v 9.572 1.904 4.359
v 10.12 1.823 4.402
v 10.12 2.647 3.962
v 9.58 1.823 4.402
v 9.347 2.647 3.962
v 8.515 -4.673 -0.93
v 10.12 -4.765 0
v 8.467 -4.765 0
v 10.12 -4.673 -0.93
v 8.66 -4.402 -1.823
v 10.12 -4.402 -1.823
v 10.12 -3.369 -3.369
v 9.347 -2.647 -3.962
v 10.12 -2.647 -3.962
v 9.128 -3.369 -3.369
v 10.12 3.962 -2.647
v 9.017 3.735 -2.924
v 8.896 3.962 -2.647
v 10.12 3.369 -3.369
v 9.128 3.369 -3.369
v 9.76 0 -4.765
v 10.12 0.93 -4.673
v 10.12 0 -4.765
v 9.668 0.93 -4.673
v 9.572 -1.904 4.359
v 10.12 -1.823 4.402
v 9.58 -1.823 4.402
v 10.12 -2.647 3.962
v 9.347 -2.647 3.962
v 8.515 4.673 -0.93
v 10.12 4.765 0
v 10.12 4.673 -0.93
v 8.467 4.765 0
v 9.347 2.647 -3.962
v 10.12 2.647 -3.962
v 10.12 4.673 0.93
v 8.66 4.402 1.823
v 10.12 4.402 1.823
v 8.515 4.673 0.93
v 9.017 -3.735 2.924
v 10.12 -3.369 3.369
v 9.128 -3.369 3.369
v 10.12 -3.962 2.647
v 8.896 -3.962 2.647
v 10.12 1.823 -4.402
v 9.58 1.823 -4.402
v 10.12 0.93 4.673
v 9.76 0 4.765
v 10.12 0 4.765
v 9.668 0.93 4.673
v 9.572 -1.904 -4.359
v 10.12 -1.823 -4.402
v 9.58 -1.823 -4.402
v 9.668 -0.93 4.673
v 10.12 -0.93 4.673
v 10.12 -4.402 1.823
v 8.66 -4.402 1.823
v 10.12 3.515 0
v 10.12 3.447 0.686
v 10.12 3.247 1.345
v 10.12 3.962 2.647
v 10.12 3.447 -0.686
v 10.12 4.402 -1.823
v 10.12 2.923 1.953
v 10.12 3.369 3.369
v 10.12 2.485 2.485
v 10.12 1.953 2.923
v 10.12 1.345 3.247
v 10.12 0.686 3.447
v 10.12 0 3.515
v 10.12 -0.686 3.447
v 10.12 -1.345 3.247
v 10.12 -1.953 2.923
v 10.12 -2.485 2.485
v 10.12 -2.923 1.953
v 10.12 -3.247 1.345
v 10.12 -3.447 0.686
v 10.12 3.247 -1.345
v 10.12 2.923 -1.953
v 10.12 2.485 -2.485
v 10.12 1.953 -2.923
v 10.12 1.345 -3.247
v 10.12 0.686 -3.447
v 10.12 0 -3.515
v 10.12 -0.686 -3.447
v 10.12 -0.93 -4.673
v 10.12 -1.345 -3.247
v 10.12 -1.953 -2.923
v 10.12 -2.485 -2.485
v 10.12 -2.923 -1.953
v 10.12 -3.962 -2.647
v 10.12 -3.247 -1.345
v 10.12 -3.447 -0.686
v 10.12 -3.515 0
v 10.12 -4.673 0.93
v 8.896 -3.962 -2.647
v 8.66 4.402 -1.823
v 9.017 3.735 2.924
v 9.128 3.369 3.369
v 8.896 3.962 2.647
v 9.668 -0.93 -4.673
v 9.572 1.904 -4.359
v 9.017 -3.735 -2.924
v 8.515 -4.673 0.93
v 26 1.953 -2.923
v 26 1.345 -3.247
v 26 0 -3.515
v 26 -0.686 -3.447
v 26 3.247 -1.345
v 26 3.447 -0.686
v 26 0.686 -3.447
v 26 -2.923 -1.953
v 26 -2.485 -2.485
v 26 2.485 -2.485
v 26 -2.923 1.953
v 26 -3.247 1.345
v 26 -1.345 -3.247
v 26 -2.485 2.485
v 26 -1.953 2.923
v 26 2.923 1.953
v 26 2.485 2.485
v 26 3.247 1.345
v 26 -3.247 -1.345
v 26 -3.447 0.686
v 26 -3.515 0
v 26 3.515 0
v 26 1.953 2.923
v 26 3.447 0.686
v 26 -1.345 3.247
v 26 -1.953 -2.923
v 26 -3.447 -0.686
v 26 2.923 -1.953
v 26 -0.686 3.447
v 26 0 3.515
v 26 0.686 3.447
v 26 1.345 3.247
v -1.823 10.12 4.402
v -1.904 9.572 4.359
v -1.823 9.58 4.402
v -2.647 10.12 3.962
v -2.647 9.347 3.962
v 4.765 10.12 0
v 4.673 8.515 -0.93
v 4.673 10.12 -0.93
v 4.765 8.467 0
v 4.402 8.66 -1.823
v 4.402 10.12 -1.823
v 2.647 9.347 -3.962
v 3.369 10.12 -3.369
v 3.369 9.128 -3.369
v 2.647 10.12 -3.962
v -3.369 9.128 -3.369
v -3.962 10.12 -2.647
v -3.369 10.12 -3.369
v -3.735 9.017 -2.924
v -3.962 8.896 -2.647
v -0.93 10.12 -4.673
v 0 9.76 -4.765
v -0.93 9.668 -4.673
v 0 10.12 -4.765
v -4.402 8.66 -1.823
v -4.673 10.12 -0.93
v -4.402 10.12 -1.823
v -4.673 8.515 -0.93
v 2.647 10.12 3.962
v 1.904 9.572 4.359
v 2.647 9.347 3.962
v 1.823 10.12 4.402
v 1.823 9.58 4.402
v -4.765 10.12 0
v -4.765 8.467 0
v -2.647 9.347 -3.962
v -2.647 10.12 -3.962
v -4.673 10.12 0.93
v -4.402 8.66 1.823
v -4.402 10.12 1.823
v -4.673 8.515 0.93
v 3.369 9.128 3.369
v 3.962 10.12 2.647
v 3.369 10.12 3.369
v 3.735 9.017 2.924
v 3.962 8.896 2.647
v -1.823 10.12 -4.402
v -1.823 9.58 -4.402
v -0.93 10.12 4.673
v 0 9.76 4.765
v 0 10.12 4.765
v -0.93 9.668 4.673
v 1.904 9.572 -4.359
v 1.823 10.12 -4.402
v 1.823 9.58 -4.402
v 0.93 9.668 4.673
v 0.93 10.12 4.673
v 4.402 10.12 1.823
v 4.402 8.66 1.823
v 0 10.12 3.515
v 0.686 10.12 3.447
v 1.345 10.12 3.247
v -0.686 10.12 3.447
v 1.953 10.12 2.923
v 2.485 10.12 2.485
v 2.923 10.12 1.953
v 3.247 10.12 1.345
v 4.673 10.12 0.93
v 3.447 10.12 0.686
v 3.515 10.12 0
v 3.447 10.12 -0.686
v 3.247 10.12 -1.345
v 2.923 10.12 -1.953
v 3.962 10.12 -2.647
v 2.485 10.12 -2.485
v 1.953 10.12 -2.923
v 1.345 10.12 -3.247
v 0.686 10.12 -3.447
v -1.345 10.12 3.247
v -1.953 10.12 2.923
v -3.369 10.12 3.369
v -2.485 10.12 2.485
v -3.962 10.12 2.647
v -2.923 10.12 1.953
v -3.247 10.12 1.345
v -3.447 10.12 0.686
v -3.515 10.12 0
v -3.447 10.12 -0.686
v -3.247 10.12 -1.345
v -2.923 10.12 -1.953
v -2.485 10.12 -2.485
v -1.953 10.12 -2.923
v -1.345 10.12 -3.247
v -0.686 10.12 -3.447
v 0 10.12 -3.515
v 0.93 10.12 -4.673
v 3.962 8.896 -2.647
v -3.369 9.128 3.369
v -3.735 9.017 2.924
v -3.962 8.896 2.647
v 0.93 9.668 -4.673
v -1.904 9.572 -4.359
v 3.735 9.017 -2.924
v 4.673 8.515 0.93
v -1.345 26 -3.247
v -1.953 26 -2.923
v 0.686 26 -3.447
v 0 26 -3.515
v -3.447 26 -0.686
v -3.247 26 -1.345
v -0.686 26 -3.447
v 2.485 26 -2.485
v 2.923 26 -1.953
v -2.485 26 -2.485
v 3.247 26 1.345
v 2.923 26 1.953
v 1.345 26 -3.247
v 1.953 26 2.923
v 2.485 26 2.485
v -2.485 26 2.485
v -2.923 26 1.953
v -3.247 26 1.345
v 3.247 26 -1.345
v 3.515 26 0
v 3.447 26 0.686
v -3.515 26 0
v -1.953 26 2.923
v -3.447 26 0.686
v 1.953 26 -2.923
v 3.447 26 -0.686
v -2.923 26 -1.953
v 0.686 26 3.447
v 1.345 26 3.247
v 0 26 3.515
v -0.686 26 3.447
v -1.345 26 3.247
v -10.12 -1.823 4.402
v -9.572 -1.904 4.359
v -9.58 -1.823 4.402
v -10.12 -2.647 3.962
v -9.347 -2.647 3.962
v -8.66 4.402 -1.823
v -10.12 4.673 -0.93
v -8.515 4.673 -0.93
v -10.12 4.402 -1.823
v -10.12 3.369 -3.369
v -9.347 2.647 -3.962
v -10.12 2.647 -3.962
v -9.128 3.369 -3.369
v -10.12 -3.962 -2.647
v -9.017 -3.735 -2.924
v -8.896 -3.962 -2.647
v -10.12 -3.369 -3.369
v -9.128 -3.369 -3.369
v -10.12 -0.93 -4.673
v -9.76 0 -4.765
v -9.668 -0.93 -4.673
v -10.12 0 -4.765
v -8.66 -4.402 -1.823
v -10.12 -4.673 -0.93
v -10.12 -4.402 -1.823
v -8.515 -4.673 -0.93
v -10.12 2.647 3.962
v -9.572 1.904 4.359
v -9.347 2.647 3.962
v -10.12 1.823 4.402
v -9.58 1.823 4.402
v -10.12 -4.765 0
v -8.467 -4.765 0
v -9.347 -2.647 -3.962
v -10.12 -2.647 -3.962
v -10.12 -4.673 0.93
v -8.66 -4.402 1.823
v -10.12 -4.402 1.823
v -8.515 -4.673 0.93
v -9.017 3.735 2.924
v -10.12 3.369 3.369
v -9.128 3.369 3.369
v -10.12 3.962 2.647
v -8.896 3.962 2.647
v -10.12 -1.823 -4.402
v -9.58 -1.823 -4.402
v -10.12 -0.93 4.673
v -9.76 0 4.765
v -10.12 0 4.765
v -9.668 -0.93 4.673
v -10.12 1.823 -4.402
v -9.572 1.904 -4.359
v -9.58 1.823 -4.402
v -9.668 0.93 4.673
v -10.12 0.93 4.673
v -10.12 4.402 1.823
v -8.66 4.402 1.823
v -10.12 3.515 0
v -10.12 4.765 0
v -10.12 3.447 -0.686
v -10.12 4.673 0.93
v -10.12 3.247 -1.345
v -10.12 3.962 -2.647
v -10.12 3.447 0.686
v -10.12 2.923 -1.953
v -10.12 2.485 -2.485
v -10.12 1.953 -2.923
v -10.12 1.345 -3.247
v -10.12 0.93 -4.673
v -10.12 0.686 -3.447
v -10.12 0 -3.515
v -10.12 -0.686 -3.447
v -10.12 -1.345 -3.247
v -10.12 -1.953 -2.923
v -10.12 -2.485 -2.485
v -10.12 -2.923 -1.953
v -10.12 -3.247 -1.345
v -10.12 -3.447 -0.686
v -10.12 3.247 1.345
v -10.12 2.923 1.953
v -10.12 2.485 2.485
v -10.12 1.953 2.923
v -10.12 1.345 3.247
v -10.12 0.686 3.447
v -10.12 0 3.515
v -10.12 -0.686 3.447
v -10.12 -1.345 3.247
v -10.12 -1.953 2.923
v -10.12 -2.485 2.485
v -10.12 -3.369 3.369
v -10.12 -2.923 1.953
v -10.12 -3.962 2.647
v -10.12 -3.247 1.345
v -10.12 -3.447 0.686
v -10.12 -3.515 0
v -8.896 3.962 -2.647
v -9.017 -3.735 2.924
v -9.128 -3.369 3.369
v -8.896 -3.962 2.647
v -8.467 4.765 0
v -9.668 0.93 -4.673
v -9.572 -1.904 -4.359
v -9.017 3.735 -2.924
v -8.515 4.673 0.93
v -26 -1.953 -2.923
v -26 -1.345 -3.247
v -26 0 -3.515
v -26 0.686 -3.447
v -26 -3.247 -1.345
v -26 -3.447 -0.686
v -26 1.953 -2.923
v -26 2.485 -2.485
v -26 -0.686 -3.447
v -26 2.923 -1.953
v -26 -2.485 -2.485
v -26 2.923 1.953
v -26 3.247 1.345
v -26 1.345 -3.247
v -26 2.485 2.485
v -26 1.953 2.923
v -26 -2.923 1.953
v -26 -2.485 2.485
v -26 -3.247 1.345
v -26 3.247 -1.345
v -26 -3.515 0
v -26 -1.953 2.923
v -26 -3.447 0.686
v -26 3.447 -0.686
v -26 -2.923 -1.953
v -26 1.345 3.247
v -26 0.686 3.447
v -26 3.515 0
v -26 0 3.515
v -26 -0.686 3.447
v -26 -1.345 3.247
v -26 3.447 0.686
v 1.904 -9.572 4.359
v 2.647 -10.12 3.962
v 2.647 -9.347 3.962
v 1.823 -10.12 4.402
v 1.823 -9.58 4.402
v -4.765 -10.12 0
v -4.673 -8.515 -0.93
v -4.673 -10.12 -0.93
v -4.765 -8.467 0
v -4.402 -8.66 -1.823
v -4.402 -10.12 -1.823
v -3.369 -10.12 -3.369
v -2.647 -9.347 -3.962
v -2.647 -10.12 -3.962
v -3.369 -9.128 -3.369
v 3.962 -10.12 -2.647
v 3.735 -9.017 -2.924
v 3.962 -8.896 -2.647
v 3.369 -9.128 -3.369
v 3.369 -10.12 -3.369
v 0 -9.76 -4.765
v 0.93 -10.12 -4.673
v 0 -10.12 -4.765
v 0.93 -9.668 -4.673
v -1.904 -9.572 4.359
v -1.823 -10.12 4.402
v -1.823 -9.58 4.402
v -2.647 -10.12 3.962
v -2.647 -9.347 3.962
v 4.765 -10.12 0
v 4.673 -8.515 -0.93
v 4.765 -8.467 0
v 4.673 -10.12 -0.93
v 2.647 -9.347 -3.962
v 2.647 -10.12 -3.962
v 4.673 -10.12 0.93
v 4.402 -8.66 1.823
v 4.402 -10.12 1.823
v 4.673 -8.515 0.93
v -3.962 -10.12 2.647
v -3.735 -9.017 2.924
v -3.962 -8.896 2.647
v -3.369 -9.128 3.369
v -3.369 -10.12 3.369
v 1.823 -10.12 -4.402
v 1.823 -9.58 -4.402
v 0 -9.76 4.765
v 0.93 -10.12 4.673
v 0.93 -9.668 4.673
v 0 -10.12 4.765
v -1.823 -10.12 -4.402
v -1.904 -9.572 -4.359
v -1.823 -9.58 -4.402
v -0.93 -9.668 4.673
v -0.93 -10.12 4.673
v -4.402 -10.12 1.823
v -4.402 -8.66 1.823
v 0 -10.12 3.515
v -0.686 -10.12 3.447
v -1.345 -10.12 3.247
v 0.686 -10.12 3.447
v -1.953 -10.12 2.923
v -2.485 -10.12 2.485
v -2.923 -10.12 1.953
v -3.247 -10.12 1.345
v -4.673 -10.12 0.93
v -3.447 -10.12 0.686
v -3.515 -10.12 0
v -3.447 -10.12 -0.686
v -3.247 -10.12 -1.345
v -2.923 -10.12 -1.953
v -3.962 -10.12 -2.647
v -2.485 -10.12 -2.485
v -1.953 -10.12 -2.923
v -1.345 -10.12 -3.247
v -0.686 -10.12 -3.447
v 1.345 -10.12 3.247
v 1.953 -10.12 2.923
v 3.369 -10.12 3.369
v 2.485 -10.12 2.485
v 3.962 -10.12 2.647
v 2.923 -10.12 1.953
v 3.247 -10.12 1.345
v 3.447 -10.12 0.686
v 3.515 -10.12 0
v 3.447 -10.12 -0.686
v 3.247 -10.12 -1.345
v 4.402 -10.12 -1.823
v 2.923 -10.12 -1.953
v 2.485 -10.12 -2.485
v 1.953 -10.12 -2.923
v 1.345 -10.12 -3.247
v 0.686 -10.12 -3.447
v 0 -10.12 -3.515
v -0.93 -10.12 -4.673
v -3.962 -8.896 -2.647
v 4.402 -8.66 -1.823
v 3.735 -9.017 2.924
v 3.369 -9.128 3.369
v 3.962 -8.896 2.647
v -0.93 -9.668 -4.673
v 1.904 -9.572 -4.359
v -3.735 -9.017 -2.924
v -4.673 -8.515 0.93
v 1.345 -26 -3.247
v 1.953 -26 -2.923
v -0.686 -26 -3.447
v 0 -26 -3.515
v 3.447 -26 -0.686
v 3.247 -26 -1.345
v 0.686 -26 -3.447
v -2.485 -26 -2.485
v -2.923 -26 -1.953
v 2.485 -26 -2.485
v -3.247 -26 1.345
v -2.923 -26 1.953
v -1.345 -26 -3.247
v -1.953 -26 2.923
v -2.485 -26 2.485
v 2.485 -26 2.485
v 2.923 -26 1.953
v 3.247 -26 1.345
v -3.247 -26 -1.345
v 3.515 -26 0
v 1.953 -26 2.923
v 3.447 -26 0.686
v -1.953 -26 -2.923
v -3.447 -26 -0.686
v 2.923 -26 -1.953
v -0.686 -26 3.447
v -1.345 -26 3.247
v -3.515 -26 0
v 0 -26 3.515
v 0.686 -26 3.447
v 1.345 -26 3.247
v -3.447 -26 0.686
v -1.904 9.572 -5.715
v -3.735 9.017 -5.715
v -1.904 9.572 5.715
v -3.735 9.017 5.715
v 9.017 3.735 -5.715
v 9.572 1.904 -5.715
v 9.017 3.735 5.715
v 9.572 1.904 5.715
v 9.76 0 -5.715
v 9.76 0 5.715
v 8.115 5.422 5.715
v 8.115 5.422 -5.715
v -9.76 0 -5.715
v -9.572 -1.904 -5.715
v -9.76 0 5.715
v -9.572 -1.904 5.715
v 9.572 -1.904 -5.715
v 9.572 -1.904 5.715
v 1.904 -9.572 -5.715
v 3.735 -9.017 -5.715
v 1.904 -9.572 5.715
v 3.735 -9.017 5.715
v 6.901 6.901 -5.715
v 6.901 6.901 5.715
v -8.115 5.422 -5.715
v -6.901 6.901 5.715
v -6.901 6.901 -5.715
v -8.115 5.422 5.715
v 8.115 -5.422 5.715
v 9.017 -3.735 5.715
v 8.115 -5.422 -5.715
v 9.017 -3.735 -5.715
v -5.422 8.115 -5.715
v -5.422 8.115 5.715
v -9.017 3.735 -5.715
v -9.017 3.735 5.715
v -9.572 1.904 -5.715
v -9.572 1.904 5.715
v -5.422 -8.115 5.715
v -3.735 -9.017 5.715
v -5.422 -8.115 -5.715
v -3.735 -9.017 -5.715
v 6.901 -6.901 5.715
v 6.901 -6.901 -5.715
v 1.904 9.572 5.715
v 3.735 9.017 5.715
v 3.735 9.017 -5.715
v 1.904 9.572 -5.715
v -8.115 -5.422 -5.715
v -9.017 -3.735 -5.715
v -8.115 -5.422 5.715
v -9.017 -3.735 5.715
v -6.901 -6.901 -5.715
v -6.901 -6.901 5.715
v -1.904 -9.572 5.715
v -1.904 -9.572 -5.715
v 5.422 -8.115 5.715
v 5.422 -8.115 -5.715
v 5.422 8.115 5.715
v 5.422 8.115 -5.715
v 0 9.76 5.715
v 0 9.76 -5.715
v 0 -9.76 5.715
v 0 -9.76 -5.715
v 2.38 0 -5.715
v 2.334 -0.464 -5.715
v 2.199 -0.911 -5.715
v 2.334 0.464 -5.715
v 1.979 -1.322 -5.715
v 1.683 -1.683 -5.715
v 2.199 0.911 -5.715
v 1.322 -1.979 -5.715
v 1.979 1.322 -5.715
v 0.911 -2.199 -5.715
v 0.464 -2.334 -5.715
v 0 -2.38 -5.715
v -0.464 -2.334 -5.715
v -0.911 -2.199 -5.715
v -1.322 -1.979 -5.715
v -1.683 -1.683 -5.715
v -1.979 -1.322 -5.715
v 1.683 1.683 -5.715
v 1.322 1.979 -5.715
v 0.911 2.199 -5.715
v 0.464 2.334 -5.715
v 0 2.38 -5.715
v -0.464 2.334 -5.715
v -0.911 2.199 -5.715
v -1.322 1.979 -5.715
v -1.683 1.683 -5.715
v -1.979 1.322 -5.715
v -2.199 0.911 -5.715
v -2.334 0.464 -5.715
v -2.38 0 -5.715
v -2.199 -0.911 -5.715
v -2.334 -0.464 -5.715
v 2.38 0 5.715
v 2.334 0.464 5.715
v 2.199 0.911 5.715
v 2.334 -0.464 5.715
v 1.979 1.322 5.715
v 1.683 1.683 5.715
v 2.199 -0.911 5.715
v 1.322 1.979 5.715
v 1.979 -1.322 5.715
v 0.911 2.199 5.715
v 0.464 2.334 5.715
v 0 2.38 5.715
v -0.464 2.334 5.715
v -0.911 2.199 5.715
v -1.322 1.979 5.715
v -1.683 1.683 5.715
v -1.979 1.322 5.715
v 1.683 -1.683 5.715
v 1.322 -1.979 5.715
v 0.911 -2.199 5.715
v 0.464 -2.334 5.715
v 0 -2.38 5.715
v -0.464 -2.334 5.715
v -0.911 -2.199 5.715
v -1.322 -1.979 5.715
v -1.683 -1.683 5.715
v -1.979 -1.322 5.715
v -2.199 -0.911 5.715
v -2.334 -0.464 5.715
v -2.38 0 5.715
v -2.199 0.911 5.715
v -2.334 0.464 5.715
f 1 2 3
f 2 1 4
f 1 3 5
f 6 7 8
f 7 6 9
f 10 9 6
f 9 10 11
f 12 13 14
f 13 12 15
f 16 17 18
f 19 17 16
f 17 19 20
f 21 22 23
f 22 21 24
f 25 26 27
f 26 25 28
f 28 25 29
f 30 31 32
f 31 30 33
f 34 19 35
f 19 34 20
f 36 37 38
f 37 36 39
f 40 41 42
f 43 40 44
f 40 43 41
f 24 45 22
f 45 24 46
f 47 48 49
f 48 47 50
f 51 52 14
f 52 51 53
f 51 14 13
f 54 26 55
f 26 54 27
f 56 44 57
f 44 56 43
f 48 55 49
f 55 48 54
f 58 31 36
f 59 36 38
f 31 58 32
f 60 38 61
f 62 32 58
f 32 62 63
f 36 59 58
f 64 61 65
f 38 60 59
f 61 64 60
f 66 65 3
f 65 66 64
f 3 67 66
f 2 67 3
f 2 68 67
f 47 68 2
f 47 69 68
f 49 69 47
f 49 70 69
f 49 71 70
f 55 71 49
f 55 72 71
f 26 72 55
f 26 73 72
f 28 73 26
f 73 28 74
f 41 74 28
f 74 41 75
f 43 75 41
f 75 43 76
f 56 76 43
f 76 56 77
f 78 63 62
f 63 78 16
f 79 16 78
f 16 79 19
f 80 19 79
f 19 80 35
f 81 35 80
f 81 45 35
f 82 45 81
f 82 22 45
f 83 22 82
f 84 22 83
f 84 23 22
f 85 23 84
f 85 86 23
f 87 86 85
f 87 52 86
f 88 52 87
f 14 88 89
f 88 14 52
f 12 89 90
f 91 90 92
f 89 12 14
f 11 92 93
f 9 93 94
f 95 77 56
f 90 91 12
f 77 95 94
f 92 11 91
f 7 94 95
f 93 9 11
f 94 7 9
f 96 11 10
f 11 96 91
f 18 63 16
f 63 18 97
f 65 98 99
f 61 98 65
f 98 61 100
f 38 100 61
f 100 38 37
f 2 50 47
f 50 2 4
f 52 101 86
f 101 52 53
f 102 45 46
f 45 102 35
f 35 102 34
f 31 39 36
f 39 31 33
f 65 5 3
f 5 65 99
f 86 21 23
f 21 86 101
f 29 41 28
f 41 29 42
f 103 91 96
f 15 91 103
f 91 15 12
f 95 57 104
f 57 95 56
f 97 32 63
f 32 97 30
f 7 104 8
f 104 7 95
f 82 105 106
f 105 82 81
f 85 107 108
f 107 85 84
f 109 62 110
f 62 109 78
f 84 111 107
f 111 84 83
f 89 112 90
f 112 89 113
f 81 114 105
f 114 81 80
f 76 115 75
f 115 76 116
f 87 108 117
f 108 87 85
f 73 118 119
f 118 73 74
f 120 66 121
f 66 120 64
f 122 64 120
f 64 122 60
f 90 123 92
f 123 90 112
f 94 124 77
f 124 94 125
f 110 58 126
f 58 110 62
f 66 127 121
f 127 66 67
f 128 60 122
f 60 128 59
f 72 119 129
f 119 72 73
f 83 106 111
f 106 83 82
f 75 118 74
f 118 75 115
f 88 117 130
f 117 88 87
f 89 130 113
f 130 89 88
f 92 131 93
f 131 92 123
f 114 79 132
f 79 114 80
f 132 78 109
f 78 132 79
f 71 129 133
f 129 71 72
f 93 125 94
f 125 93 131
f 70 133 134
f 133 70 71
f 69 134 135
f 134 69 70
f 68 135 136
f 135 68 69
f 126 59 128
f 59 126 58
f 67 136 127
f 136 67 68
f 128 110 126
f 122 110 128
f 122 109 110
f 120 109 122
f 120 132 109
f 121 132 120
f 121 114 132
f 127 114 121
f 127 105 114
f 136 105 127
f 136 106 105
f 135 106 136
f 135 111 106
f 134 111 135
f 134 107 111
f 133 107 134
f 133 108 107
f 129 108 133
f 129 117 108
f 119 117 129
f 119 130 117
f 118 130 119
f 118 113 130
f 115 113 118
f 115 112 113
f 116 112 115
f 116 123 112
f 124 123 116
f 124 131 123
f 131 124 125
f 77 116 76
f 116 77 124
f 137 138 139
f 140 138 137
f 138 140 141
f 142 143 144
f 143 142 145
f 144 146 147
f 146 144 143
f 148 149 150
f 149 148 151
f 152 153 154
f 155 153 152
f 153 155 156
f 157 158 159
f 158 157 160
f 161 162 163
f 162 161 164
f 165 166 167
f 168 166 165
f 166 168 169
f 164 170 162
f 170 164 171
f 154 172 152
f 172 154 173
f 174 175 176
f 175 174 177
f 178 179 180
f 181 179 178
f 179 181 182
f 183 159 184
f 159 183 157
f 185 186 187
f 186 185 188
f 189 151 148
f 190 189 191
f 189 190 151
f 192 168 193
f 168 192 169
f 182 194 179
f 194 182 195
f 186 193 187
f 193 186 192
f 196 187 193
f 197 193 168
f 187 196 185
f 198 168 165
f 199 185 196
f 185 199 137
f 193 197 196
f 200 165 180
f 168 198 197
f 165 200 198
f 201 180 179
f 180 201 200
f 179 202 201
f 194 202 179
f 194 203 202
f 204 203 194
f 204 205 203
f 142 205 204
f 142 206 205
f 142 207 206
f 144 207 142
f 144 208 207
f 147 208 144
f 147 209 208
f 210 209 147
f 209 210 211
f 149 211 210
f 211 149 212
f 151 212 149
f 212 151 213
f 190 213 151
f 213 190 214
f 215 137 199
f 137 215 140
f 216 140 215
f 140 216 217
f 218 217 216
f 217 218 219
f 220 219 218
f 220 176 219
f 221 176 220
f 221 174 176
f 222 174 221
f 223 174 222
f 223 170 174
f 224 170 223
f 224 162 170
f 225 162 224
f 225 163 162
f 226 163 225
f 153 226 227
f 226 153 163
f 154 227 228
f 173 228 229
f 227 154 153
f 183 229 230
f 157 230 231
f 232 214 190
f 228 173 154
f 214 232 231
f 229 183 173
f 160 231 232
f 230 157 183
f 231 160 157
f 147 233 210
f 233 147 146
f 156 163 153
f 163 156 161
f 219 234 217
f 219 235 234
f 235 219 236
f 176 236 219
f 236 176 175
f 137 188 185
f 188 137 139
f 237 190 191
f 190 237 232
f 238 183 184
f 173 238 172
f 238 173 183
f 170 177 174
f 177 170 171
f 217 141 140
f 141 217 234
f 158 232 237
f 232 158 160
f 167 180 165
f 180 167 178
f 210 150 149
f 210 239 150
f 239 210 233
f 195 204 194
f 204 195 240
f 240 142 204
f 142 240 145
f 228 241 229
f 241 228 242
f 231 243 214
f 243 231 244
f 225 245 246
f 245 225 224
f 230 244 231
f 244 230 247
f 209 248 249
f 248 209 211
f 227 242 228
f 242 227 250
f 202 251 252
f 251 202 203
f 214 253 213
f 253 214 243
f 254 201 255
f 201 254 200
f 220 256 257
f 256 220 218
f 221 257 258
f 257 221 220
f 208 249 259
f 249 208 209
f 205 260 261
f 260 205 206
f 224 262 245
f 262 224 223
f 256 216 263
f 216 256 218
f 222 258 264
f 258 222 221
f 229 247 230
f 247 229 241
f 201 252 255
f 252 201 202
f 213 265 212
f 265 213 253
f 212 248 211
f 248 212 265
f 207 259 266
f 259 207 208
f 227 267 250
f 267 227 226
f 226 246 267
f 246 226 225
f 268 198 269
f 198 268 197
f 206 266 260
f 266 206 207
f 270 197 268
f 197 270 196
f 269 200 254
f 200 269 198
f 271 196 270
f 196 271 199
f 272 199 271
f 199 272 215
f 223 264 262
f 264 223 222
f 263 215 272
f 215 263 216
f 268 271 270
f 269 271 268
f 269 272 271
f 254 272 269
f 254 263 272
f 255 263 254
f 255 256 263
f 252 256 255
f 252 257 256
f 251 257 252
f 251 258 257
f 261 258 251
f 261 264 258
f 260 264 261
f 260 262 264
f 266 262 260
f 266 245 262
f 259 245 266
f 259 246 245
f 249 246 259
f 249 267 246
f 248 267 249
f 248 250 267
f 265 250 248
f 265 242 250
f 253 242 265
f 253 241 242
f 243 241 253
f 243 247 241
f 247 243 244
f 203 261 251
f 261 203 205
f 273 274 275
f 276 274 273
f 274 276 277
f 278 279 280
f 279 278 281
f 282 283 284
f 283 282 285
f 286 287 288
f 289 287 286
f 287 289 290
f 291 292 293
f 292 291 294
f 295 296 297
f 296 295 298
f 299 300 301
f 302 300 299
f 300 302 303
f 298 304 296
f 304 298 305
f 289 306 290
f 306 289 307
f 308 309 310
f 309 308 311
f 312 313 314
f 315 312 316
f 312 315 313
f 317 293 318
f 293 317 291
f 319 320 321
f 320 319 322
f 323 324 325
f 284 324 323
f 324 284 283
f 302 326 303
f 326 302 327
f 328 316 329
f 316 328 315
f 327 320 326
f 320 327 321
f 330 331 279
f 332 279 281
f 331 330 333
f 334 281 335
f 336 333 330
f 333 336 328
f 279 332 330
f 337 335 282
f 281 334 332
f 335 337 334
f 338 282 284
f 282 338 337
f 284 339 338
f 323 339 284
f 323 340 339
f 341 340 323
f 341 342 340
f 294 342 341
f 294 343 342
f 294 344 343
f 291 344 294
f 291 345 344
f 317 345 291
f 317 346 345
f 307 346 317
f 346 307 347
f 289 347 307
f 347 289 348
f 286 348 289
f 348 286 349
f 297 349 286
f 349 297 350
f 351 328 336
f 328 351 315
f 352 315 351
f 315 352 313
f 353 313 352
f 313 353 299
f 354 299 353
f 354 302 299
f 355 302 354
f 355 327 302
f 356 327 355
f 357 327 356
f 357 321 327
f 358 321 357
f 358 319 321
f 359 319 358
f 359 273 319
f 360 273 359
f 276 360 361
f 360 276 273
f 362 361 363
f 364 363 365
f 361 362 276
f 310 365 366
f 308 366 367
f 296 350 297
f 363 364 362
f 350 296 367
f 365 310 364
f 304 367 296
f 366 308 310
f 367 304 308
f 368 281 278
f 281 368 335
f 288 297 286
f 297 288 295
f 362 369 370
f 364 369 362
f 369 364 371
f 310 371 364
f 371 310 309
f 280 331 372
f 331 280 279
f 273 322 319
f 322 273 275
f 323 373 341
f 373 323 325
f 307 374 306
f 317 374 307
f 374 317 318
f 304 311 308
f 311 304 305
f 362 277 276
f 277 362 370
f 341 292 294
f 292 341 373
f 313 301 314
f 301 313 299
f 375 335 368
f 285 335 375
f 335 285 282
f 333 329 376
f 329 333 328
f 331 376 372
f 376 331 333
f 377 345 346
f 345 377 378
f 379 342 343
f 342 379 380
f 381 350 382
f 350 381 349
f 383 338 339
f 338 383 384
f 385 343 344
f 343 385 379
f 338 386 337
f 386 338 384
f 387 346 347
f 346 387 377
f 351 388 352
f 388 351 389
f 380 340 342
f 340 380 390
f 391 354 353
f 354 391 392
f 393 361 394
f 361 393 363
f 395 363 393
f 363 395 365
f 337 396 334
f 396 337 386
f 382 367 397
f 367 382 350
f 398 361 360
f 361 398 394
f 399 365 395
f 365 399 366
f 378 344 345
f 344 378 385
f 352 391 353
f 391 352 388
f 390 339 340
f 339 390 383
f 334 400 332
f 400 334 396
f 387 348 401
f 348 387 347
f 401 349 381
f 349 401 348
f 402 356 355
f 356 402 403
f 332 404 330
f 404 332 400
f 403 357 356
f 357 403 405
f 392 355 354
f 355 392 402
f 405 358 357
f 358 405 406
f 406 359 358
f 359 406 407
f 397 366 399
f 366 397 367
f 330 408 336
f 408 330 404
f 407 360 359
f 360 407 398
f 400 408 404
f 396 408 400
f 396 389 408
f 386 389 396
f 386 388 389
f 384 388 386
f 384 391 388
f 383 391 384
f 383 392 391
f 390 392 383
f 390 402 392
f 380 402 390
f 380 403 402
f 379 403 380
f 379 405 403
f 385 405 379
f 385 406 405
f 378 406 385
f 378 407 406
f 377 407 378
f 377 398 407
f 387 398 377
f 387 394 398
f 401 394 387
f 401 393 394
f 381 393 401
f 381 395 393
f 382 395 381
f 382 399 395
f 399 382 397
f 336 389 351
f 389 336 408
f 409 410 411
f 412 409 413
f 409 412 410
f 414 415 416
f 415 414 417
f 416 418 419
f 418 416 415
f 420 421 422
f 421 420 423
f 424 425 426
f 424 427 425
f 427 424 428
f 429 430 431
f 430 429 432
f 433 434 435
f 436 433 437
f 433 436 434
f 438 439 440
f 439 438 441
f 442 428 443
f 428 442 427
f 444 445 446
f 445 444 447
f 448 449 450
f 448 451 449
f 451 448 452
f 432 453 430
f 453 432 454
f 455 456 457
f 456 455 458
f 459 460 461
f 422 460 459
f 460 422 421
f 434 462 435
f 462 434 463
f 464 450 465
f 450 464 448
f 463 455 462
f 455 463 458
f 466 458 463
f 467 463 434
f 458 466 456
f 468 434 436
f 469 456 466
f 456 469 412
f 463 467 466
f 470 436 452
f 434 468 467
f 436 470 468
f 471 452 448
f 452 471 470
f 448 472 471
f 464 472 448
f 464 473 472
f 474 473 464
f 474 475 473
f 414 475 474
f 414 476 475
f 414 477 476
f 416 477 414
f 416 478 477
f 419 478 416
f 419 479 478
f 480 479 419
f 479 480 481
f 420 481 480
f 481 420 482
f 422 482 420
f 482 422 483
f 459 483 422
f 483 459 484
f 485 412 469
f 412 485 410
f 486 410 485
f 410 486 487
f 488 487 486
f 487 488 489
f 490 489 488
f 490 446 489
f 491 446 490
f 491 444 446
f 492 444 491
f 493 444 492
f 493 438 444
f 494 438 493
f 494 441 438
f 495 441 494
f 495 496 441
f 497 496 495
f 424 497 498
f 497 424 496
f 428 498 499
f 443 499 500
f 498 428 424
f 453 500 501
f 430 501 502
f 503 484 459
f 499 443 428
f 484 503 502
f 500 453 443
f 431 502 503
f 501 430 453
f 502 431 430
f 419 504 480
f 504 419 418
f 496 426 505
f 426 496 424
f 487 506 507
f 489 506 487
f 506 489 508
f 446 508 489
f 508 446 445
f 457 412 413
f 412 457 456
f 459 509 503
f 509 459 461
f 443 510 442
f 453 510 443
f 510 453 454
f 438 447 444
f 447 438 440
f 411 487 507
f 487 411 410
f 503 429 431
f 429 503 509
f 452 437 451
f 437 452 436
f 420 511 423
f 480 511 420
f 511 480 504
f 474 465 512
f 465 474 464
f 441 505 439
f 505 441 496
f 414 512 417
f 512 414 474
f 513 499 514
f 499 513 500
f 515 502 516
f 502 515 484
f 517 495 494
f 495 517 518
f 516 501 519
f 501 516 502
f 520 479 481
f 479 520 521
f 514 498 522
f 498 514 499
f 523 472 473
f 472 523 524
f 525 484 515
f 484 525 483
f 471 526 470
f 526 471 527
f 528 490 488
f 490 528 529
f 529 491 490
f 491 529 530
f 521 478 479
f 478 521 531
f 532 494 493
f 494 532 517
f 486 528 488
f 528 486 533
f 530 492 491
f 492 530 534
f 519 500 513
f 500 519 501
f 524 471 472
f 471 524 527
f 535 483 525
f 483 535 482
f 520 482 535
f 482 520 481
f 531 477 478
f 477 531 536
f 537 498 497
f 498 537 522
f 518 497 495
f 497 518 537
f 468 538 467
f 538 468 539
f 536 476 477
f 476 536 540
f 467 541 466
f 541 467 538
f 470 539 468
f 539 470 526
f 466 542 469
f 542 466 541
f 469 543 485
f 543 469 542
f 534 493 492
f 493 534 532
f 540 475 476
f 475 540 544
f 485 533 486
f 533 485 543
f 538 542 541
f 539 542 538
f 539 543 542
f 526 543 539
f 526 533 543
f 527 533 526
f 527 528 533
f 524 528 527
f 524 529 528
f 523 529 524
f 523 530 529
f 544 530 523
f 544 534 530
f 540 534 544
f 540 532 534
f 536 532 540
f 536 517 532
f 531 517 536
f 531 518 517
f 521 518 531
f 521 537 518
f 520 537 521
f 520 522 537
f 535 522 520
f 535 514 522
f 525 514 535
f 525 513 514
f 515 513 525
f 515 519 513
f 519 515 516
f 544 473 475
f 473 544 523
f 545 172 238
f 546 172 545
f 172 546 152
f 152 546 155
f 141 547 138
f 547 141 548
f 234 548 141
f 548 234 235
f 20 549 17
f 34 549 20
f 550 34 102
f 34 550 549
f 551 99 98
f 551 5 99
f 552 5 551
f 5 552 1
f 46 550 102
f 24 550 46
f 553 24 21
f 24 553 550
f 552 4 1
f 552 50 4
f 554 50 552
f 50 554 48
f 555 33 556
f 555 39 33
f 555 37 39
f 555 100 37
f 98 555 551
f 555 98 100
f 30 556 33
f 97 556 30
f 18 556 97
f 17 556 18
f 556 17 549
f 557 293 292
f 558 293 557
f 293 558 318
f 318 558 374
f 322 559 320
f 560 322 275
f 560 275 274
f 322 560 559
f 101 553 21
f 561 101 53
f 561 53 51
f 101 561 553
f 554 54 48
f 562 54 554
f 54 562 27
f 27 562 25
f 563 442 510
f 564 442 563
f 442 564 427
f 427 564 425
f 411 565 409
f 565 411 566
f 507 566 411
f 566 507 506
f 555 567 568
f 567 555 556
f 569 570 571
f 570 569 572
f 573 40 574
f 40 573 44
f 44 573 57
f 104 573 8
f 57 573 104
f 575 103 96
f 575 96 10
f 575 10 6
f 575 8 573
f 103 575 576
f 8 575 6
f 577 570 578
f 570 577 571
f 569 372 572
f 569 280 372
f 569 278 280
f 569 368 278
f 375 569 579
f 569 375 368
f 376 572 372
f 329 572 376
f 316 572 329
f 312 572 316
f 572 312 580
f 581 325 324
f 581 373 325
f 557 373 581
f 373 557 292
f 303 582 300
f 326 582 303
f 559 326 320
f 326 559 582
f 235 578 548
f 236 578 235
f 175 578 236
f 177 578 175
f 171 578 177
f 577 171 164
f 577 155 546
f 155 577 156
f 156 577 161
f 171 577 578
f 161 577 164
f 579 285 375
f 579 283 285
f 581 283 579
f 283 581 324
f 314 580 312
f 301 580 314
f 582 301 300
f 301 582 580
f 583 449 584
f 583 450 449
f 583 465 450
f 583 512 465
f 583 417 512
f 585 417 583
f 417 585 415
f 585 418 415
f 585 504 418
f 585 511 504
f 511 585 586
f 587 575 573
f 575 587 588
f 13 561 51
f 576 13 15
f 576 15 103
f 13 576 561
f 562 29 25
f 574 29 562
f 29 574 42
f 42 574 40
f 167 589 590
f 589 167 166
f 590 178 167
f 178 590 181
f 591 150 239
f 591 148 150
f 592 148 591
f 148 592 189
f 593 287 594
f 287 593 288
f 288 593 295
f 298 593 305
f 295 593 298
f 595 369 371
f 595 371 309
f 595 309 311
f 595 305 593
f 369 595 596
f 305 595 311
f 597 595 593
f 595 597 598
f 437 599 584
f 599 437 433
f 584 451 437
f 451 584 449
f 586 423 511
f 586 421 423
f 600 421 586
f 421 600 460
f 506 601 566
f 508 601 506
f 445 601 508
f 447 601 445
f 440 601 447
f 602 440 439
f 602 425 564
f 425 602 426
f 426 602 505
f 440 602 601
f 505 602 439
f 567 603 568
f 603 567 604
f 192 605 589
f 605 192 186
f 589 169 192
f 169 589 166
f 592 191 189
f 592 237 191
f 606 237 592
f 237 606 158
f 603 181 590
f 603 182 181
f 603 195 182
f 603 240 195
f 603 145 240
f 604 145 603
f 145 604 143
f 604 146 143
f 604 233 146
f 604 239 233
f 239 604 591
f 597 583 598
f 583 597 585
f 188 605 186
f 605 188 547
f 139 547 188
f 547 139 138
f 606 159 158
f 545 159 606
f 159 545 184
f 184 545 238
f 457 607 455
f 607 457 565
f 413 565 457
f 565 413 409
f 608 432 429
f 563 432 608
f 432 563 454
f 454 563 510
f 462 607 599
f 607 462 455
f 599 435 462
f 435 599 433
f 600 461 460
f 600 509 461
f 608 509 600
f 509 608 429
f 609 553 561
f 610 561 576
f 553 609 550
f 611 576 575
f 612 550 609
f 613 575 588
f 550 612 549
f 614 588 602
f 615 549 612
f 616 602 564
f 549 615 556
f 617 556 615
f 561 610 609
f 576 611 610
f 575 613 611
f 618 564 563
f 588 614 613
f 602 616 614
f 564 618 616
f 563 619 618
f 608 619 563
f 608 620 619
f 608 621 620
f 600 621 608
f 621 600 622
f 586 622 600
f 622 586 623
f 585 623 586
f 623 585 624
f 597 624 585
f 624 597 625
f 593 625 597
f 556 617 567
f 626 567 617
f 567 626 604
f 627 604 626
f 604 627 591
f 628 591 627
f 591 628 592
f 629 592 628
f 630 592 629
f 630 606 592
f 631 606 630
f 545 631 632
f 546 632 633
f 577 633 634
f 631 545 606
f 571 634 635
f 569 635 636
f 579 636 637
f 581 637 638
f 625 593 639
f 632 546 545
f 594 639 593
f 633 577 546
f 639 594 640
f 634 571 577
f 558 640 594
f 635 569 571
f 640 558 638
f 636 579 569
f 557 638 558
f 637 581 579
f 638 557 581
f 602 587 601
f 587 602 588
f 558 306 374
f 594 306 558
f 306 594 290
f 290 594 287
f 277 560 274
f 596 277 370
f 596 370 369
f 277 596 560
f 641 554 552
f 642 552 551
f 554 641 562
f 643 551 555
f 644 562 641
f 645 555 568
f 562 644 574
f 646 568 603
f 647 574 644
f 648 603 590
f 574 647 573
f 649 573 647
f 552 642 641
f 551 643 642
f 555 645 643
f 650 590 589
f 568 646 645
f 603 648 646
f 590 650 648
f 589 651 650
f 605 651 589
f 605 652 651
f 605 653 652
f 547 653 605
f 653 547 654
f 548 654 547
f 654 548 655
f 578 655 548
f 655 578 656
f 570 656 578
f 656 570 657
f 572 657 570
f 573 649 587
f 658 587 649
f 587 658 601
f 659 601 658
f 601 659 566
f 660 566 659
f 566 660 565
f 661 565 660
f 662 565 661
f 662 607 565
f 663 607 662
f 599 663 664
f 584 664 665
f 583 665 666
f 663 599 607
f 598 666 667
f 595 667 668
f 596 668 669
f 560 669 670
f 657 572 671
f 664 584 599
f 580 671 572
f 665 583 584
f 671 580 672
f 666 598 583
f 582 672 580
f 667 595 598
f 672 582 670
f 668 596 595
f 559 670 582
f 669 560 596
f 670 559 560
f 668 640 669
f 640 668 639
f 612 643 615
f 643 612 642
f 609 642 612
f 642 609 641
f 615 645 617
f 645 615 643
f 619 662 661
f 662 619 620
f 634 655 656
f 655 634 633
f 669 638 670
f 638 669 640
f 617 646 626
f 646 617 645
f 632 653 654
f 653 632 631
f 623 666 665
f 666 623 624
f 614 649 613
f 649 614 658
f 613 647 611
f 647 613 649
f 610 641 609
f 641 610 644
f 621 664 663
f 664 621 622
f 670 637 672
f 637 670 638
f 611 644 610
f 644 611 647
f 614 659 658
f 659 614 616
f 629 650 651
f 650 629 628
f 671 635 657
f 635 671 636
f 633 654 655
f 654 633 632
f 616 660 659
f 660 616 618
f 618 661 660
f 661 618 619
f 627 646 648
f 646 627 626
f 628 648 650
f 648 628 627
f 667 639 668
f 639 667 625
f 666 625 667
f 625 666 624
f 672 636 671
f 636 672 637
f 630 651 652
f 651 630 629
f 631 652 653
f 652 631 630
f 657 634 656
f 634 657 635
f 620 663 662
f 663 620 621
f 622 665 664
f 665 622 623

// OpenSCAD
$fn = 32;

// ----------------------------------------------------------------------
// Cardan cross: 52 mm span, 9.53 mm trunnions
// ----------------------------------------------------------------------

// --- parameters (mm) ---
journal_d = 9.53;         // trunnion diameter
arm_len = 26;             // trunnion length from the centre
step_r = 3.24;            // step position from the centre
step_d = 7.03;            // journal diameter after the step
hub_d = 19.52;            // hub diameter
hub_h = 11.43;            // hub height
bore_d = 4.76;            // hub bore

difference() {
  union() {
    /* hub along the joint axis */
    cylinder(h = hub_h, d = hub_d, center = true);
    for (a = [0 : 90 : 270]) rotate([0, 0, a]) {
      /* trunnion, sunk into the hub */
      translate([hub_d / 4, 0, 0]) rotate([0, 90, 0]) cylinder(h = step_r + 2, d = journal_d);
      /* stepped journal out to the tip */
      translate([step_r - 0.5, 0, 0]) rotate([0, 90, 0]) cylinder(h = arm_len + 0.5 - step_r, d = step_d);
    }
  }
  /* lubrication bore through the hub, 2.5 mm clear on both sides */
  translate([0, 0, -hub_h / 2 - 2.5]) cylinder(h = hub_h + 5, d = bore_d);
}
